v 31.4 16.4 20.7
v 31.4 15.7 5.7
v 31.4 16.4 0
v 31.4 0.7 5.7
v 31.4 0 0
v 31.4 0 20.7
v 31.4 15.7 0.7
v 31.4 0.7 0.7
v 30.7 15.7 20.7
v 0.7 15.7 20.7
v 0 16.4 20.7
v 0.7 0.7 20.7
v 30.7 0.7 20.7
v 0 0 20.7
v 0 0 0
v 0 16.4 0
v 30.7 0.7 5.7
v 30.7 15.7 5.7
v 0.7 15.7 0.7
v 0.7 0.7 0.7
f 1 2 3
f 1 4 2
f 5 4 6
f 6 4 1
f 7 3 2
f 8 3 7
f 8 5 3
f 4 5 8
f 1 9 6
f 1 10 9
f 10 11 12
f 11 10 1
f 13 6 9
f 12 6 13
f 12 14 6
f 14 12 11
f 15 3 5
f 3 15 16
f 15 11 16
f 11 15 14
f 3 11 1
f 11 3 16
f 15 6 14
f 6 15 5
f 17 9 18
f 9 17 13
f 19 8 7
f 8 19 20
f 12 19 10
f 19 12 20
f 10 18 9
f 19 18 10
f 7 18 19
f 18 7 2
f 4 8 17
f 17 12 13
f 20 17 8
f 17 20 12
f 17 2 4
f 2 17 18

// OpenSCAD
 

$fn=5;

l = 30;
b = 15;
h = 20;
ho = 5;


d = 0.7;

difference(){
	cube([l+2*d,b+2*d,h+d]);
	translate([d,d,d]) cube([l,b,h+1]);
	translate([d+l/2,d,d]) cube([l,b,ho]);

}
